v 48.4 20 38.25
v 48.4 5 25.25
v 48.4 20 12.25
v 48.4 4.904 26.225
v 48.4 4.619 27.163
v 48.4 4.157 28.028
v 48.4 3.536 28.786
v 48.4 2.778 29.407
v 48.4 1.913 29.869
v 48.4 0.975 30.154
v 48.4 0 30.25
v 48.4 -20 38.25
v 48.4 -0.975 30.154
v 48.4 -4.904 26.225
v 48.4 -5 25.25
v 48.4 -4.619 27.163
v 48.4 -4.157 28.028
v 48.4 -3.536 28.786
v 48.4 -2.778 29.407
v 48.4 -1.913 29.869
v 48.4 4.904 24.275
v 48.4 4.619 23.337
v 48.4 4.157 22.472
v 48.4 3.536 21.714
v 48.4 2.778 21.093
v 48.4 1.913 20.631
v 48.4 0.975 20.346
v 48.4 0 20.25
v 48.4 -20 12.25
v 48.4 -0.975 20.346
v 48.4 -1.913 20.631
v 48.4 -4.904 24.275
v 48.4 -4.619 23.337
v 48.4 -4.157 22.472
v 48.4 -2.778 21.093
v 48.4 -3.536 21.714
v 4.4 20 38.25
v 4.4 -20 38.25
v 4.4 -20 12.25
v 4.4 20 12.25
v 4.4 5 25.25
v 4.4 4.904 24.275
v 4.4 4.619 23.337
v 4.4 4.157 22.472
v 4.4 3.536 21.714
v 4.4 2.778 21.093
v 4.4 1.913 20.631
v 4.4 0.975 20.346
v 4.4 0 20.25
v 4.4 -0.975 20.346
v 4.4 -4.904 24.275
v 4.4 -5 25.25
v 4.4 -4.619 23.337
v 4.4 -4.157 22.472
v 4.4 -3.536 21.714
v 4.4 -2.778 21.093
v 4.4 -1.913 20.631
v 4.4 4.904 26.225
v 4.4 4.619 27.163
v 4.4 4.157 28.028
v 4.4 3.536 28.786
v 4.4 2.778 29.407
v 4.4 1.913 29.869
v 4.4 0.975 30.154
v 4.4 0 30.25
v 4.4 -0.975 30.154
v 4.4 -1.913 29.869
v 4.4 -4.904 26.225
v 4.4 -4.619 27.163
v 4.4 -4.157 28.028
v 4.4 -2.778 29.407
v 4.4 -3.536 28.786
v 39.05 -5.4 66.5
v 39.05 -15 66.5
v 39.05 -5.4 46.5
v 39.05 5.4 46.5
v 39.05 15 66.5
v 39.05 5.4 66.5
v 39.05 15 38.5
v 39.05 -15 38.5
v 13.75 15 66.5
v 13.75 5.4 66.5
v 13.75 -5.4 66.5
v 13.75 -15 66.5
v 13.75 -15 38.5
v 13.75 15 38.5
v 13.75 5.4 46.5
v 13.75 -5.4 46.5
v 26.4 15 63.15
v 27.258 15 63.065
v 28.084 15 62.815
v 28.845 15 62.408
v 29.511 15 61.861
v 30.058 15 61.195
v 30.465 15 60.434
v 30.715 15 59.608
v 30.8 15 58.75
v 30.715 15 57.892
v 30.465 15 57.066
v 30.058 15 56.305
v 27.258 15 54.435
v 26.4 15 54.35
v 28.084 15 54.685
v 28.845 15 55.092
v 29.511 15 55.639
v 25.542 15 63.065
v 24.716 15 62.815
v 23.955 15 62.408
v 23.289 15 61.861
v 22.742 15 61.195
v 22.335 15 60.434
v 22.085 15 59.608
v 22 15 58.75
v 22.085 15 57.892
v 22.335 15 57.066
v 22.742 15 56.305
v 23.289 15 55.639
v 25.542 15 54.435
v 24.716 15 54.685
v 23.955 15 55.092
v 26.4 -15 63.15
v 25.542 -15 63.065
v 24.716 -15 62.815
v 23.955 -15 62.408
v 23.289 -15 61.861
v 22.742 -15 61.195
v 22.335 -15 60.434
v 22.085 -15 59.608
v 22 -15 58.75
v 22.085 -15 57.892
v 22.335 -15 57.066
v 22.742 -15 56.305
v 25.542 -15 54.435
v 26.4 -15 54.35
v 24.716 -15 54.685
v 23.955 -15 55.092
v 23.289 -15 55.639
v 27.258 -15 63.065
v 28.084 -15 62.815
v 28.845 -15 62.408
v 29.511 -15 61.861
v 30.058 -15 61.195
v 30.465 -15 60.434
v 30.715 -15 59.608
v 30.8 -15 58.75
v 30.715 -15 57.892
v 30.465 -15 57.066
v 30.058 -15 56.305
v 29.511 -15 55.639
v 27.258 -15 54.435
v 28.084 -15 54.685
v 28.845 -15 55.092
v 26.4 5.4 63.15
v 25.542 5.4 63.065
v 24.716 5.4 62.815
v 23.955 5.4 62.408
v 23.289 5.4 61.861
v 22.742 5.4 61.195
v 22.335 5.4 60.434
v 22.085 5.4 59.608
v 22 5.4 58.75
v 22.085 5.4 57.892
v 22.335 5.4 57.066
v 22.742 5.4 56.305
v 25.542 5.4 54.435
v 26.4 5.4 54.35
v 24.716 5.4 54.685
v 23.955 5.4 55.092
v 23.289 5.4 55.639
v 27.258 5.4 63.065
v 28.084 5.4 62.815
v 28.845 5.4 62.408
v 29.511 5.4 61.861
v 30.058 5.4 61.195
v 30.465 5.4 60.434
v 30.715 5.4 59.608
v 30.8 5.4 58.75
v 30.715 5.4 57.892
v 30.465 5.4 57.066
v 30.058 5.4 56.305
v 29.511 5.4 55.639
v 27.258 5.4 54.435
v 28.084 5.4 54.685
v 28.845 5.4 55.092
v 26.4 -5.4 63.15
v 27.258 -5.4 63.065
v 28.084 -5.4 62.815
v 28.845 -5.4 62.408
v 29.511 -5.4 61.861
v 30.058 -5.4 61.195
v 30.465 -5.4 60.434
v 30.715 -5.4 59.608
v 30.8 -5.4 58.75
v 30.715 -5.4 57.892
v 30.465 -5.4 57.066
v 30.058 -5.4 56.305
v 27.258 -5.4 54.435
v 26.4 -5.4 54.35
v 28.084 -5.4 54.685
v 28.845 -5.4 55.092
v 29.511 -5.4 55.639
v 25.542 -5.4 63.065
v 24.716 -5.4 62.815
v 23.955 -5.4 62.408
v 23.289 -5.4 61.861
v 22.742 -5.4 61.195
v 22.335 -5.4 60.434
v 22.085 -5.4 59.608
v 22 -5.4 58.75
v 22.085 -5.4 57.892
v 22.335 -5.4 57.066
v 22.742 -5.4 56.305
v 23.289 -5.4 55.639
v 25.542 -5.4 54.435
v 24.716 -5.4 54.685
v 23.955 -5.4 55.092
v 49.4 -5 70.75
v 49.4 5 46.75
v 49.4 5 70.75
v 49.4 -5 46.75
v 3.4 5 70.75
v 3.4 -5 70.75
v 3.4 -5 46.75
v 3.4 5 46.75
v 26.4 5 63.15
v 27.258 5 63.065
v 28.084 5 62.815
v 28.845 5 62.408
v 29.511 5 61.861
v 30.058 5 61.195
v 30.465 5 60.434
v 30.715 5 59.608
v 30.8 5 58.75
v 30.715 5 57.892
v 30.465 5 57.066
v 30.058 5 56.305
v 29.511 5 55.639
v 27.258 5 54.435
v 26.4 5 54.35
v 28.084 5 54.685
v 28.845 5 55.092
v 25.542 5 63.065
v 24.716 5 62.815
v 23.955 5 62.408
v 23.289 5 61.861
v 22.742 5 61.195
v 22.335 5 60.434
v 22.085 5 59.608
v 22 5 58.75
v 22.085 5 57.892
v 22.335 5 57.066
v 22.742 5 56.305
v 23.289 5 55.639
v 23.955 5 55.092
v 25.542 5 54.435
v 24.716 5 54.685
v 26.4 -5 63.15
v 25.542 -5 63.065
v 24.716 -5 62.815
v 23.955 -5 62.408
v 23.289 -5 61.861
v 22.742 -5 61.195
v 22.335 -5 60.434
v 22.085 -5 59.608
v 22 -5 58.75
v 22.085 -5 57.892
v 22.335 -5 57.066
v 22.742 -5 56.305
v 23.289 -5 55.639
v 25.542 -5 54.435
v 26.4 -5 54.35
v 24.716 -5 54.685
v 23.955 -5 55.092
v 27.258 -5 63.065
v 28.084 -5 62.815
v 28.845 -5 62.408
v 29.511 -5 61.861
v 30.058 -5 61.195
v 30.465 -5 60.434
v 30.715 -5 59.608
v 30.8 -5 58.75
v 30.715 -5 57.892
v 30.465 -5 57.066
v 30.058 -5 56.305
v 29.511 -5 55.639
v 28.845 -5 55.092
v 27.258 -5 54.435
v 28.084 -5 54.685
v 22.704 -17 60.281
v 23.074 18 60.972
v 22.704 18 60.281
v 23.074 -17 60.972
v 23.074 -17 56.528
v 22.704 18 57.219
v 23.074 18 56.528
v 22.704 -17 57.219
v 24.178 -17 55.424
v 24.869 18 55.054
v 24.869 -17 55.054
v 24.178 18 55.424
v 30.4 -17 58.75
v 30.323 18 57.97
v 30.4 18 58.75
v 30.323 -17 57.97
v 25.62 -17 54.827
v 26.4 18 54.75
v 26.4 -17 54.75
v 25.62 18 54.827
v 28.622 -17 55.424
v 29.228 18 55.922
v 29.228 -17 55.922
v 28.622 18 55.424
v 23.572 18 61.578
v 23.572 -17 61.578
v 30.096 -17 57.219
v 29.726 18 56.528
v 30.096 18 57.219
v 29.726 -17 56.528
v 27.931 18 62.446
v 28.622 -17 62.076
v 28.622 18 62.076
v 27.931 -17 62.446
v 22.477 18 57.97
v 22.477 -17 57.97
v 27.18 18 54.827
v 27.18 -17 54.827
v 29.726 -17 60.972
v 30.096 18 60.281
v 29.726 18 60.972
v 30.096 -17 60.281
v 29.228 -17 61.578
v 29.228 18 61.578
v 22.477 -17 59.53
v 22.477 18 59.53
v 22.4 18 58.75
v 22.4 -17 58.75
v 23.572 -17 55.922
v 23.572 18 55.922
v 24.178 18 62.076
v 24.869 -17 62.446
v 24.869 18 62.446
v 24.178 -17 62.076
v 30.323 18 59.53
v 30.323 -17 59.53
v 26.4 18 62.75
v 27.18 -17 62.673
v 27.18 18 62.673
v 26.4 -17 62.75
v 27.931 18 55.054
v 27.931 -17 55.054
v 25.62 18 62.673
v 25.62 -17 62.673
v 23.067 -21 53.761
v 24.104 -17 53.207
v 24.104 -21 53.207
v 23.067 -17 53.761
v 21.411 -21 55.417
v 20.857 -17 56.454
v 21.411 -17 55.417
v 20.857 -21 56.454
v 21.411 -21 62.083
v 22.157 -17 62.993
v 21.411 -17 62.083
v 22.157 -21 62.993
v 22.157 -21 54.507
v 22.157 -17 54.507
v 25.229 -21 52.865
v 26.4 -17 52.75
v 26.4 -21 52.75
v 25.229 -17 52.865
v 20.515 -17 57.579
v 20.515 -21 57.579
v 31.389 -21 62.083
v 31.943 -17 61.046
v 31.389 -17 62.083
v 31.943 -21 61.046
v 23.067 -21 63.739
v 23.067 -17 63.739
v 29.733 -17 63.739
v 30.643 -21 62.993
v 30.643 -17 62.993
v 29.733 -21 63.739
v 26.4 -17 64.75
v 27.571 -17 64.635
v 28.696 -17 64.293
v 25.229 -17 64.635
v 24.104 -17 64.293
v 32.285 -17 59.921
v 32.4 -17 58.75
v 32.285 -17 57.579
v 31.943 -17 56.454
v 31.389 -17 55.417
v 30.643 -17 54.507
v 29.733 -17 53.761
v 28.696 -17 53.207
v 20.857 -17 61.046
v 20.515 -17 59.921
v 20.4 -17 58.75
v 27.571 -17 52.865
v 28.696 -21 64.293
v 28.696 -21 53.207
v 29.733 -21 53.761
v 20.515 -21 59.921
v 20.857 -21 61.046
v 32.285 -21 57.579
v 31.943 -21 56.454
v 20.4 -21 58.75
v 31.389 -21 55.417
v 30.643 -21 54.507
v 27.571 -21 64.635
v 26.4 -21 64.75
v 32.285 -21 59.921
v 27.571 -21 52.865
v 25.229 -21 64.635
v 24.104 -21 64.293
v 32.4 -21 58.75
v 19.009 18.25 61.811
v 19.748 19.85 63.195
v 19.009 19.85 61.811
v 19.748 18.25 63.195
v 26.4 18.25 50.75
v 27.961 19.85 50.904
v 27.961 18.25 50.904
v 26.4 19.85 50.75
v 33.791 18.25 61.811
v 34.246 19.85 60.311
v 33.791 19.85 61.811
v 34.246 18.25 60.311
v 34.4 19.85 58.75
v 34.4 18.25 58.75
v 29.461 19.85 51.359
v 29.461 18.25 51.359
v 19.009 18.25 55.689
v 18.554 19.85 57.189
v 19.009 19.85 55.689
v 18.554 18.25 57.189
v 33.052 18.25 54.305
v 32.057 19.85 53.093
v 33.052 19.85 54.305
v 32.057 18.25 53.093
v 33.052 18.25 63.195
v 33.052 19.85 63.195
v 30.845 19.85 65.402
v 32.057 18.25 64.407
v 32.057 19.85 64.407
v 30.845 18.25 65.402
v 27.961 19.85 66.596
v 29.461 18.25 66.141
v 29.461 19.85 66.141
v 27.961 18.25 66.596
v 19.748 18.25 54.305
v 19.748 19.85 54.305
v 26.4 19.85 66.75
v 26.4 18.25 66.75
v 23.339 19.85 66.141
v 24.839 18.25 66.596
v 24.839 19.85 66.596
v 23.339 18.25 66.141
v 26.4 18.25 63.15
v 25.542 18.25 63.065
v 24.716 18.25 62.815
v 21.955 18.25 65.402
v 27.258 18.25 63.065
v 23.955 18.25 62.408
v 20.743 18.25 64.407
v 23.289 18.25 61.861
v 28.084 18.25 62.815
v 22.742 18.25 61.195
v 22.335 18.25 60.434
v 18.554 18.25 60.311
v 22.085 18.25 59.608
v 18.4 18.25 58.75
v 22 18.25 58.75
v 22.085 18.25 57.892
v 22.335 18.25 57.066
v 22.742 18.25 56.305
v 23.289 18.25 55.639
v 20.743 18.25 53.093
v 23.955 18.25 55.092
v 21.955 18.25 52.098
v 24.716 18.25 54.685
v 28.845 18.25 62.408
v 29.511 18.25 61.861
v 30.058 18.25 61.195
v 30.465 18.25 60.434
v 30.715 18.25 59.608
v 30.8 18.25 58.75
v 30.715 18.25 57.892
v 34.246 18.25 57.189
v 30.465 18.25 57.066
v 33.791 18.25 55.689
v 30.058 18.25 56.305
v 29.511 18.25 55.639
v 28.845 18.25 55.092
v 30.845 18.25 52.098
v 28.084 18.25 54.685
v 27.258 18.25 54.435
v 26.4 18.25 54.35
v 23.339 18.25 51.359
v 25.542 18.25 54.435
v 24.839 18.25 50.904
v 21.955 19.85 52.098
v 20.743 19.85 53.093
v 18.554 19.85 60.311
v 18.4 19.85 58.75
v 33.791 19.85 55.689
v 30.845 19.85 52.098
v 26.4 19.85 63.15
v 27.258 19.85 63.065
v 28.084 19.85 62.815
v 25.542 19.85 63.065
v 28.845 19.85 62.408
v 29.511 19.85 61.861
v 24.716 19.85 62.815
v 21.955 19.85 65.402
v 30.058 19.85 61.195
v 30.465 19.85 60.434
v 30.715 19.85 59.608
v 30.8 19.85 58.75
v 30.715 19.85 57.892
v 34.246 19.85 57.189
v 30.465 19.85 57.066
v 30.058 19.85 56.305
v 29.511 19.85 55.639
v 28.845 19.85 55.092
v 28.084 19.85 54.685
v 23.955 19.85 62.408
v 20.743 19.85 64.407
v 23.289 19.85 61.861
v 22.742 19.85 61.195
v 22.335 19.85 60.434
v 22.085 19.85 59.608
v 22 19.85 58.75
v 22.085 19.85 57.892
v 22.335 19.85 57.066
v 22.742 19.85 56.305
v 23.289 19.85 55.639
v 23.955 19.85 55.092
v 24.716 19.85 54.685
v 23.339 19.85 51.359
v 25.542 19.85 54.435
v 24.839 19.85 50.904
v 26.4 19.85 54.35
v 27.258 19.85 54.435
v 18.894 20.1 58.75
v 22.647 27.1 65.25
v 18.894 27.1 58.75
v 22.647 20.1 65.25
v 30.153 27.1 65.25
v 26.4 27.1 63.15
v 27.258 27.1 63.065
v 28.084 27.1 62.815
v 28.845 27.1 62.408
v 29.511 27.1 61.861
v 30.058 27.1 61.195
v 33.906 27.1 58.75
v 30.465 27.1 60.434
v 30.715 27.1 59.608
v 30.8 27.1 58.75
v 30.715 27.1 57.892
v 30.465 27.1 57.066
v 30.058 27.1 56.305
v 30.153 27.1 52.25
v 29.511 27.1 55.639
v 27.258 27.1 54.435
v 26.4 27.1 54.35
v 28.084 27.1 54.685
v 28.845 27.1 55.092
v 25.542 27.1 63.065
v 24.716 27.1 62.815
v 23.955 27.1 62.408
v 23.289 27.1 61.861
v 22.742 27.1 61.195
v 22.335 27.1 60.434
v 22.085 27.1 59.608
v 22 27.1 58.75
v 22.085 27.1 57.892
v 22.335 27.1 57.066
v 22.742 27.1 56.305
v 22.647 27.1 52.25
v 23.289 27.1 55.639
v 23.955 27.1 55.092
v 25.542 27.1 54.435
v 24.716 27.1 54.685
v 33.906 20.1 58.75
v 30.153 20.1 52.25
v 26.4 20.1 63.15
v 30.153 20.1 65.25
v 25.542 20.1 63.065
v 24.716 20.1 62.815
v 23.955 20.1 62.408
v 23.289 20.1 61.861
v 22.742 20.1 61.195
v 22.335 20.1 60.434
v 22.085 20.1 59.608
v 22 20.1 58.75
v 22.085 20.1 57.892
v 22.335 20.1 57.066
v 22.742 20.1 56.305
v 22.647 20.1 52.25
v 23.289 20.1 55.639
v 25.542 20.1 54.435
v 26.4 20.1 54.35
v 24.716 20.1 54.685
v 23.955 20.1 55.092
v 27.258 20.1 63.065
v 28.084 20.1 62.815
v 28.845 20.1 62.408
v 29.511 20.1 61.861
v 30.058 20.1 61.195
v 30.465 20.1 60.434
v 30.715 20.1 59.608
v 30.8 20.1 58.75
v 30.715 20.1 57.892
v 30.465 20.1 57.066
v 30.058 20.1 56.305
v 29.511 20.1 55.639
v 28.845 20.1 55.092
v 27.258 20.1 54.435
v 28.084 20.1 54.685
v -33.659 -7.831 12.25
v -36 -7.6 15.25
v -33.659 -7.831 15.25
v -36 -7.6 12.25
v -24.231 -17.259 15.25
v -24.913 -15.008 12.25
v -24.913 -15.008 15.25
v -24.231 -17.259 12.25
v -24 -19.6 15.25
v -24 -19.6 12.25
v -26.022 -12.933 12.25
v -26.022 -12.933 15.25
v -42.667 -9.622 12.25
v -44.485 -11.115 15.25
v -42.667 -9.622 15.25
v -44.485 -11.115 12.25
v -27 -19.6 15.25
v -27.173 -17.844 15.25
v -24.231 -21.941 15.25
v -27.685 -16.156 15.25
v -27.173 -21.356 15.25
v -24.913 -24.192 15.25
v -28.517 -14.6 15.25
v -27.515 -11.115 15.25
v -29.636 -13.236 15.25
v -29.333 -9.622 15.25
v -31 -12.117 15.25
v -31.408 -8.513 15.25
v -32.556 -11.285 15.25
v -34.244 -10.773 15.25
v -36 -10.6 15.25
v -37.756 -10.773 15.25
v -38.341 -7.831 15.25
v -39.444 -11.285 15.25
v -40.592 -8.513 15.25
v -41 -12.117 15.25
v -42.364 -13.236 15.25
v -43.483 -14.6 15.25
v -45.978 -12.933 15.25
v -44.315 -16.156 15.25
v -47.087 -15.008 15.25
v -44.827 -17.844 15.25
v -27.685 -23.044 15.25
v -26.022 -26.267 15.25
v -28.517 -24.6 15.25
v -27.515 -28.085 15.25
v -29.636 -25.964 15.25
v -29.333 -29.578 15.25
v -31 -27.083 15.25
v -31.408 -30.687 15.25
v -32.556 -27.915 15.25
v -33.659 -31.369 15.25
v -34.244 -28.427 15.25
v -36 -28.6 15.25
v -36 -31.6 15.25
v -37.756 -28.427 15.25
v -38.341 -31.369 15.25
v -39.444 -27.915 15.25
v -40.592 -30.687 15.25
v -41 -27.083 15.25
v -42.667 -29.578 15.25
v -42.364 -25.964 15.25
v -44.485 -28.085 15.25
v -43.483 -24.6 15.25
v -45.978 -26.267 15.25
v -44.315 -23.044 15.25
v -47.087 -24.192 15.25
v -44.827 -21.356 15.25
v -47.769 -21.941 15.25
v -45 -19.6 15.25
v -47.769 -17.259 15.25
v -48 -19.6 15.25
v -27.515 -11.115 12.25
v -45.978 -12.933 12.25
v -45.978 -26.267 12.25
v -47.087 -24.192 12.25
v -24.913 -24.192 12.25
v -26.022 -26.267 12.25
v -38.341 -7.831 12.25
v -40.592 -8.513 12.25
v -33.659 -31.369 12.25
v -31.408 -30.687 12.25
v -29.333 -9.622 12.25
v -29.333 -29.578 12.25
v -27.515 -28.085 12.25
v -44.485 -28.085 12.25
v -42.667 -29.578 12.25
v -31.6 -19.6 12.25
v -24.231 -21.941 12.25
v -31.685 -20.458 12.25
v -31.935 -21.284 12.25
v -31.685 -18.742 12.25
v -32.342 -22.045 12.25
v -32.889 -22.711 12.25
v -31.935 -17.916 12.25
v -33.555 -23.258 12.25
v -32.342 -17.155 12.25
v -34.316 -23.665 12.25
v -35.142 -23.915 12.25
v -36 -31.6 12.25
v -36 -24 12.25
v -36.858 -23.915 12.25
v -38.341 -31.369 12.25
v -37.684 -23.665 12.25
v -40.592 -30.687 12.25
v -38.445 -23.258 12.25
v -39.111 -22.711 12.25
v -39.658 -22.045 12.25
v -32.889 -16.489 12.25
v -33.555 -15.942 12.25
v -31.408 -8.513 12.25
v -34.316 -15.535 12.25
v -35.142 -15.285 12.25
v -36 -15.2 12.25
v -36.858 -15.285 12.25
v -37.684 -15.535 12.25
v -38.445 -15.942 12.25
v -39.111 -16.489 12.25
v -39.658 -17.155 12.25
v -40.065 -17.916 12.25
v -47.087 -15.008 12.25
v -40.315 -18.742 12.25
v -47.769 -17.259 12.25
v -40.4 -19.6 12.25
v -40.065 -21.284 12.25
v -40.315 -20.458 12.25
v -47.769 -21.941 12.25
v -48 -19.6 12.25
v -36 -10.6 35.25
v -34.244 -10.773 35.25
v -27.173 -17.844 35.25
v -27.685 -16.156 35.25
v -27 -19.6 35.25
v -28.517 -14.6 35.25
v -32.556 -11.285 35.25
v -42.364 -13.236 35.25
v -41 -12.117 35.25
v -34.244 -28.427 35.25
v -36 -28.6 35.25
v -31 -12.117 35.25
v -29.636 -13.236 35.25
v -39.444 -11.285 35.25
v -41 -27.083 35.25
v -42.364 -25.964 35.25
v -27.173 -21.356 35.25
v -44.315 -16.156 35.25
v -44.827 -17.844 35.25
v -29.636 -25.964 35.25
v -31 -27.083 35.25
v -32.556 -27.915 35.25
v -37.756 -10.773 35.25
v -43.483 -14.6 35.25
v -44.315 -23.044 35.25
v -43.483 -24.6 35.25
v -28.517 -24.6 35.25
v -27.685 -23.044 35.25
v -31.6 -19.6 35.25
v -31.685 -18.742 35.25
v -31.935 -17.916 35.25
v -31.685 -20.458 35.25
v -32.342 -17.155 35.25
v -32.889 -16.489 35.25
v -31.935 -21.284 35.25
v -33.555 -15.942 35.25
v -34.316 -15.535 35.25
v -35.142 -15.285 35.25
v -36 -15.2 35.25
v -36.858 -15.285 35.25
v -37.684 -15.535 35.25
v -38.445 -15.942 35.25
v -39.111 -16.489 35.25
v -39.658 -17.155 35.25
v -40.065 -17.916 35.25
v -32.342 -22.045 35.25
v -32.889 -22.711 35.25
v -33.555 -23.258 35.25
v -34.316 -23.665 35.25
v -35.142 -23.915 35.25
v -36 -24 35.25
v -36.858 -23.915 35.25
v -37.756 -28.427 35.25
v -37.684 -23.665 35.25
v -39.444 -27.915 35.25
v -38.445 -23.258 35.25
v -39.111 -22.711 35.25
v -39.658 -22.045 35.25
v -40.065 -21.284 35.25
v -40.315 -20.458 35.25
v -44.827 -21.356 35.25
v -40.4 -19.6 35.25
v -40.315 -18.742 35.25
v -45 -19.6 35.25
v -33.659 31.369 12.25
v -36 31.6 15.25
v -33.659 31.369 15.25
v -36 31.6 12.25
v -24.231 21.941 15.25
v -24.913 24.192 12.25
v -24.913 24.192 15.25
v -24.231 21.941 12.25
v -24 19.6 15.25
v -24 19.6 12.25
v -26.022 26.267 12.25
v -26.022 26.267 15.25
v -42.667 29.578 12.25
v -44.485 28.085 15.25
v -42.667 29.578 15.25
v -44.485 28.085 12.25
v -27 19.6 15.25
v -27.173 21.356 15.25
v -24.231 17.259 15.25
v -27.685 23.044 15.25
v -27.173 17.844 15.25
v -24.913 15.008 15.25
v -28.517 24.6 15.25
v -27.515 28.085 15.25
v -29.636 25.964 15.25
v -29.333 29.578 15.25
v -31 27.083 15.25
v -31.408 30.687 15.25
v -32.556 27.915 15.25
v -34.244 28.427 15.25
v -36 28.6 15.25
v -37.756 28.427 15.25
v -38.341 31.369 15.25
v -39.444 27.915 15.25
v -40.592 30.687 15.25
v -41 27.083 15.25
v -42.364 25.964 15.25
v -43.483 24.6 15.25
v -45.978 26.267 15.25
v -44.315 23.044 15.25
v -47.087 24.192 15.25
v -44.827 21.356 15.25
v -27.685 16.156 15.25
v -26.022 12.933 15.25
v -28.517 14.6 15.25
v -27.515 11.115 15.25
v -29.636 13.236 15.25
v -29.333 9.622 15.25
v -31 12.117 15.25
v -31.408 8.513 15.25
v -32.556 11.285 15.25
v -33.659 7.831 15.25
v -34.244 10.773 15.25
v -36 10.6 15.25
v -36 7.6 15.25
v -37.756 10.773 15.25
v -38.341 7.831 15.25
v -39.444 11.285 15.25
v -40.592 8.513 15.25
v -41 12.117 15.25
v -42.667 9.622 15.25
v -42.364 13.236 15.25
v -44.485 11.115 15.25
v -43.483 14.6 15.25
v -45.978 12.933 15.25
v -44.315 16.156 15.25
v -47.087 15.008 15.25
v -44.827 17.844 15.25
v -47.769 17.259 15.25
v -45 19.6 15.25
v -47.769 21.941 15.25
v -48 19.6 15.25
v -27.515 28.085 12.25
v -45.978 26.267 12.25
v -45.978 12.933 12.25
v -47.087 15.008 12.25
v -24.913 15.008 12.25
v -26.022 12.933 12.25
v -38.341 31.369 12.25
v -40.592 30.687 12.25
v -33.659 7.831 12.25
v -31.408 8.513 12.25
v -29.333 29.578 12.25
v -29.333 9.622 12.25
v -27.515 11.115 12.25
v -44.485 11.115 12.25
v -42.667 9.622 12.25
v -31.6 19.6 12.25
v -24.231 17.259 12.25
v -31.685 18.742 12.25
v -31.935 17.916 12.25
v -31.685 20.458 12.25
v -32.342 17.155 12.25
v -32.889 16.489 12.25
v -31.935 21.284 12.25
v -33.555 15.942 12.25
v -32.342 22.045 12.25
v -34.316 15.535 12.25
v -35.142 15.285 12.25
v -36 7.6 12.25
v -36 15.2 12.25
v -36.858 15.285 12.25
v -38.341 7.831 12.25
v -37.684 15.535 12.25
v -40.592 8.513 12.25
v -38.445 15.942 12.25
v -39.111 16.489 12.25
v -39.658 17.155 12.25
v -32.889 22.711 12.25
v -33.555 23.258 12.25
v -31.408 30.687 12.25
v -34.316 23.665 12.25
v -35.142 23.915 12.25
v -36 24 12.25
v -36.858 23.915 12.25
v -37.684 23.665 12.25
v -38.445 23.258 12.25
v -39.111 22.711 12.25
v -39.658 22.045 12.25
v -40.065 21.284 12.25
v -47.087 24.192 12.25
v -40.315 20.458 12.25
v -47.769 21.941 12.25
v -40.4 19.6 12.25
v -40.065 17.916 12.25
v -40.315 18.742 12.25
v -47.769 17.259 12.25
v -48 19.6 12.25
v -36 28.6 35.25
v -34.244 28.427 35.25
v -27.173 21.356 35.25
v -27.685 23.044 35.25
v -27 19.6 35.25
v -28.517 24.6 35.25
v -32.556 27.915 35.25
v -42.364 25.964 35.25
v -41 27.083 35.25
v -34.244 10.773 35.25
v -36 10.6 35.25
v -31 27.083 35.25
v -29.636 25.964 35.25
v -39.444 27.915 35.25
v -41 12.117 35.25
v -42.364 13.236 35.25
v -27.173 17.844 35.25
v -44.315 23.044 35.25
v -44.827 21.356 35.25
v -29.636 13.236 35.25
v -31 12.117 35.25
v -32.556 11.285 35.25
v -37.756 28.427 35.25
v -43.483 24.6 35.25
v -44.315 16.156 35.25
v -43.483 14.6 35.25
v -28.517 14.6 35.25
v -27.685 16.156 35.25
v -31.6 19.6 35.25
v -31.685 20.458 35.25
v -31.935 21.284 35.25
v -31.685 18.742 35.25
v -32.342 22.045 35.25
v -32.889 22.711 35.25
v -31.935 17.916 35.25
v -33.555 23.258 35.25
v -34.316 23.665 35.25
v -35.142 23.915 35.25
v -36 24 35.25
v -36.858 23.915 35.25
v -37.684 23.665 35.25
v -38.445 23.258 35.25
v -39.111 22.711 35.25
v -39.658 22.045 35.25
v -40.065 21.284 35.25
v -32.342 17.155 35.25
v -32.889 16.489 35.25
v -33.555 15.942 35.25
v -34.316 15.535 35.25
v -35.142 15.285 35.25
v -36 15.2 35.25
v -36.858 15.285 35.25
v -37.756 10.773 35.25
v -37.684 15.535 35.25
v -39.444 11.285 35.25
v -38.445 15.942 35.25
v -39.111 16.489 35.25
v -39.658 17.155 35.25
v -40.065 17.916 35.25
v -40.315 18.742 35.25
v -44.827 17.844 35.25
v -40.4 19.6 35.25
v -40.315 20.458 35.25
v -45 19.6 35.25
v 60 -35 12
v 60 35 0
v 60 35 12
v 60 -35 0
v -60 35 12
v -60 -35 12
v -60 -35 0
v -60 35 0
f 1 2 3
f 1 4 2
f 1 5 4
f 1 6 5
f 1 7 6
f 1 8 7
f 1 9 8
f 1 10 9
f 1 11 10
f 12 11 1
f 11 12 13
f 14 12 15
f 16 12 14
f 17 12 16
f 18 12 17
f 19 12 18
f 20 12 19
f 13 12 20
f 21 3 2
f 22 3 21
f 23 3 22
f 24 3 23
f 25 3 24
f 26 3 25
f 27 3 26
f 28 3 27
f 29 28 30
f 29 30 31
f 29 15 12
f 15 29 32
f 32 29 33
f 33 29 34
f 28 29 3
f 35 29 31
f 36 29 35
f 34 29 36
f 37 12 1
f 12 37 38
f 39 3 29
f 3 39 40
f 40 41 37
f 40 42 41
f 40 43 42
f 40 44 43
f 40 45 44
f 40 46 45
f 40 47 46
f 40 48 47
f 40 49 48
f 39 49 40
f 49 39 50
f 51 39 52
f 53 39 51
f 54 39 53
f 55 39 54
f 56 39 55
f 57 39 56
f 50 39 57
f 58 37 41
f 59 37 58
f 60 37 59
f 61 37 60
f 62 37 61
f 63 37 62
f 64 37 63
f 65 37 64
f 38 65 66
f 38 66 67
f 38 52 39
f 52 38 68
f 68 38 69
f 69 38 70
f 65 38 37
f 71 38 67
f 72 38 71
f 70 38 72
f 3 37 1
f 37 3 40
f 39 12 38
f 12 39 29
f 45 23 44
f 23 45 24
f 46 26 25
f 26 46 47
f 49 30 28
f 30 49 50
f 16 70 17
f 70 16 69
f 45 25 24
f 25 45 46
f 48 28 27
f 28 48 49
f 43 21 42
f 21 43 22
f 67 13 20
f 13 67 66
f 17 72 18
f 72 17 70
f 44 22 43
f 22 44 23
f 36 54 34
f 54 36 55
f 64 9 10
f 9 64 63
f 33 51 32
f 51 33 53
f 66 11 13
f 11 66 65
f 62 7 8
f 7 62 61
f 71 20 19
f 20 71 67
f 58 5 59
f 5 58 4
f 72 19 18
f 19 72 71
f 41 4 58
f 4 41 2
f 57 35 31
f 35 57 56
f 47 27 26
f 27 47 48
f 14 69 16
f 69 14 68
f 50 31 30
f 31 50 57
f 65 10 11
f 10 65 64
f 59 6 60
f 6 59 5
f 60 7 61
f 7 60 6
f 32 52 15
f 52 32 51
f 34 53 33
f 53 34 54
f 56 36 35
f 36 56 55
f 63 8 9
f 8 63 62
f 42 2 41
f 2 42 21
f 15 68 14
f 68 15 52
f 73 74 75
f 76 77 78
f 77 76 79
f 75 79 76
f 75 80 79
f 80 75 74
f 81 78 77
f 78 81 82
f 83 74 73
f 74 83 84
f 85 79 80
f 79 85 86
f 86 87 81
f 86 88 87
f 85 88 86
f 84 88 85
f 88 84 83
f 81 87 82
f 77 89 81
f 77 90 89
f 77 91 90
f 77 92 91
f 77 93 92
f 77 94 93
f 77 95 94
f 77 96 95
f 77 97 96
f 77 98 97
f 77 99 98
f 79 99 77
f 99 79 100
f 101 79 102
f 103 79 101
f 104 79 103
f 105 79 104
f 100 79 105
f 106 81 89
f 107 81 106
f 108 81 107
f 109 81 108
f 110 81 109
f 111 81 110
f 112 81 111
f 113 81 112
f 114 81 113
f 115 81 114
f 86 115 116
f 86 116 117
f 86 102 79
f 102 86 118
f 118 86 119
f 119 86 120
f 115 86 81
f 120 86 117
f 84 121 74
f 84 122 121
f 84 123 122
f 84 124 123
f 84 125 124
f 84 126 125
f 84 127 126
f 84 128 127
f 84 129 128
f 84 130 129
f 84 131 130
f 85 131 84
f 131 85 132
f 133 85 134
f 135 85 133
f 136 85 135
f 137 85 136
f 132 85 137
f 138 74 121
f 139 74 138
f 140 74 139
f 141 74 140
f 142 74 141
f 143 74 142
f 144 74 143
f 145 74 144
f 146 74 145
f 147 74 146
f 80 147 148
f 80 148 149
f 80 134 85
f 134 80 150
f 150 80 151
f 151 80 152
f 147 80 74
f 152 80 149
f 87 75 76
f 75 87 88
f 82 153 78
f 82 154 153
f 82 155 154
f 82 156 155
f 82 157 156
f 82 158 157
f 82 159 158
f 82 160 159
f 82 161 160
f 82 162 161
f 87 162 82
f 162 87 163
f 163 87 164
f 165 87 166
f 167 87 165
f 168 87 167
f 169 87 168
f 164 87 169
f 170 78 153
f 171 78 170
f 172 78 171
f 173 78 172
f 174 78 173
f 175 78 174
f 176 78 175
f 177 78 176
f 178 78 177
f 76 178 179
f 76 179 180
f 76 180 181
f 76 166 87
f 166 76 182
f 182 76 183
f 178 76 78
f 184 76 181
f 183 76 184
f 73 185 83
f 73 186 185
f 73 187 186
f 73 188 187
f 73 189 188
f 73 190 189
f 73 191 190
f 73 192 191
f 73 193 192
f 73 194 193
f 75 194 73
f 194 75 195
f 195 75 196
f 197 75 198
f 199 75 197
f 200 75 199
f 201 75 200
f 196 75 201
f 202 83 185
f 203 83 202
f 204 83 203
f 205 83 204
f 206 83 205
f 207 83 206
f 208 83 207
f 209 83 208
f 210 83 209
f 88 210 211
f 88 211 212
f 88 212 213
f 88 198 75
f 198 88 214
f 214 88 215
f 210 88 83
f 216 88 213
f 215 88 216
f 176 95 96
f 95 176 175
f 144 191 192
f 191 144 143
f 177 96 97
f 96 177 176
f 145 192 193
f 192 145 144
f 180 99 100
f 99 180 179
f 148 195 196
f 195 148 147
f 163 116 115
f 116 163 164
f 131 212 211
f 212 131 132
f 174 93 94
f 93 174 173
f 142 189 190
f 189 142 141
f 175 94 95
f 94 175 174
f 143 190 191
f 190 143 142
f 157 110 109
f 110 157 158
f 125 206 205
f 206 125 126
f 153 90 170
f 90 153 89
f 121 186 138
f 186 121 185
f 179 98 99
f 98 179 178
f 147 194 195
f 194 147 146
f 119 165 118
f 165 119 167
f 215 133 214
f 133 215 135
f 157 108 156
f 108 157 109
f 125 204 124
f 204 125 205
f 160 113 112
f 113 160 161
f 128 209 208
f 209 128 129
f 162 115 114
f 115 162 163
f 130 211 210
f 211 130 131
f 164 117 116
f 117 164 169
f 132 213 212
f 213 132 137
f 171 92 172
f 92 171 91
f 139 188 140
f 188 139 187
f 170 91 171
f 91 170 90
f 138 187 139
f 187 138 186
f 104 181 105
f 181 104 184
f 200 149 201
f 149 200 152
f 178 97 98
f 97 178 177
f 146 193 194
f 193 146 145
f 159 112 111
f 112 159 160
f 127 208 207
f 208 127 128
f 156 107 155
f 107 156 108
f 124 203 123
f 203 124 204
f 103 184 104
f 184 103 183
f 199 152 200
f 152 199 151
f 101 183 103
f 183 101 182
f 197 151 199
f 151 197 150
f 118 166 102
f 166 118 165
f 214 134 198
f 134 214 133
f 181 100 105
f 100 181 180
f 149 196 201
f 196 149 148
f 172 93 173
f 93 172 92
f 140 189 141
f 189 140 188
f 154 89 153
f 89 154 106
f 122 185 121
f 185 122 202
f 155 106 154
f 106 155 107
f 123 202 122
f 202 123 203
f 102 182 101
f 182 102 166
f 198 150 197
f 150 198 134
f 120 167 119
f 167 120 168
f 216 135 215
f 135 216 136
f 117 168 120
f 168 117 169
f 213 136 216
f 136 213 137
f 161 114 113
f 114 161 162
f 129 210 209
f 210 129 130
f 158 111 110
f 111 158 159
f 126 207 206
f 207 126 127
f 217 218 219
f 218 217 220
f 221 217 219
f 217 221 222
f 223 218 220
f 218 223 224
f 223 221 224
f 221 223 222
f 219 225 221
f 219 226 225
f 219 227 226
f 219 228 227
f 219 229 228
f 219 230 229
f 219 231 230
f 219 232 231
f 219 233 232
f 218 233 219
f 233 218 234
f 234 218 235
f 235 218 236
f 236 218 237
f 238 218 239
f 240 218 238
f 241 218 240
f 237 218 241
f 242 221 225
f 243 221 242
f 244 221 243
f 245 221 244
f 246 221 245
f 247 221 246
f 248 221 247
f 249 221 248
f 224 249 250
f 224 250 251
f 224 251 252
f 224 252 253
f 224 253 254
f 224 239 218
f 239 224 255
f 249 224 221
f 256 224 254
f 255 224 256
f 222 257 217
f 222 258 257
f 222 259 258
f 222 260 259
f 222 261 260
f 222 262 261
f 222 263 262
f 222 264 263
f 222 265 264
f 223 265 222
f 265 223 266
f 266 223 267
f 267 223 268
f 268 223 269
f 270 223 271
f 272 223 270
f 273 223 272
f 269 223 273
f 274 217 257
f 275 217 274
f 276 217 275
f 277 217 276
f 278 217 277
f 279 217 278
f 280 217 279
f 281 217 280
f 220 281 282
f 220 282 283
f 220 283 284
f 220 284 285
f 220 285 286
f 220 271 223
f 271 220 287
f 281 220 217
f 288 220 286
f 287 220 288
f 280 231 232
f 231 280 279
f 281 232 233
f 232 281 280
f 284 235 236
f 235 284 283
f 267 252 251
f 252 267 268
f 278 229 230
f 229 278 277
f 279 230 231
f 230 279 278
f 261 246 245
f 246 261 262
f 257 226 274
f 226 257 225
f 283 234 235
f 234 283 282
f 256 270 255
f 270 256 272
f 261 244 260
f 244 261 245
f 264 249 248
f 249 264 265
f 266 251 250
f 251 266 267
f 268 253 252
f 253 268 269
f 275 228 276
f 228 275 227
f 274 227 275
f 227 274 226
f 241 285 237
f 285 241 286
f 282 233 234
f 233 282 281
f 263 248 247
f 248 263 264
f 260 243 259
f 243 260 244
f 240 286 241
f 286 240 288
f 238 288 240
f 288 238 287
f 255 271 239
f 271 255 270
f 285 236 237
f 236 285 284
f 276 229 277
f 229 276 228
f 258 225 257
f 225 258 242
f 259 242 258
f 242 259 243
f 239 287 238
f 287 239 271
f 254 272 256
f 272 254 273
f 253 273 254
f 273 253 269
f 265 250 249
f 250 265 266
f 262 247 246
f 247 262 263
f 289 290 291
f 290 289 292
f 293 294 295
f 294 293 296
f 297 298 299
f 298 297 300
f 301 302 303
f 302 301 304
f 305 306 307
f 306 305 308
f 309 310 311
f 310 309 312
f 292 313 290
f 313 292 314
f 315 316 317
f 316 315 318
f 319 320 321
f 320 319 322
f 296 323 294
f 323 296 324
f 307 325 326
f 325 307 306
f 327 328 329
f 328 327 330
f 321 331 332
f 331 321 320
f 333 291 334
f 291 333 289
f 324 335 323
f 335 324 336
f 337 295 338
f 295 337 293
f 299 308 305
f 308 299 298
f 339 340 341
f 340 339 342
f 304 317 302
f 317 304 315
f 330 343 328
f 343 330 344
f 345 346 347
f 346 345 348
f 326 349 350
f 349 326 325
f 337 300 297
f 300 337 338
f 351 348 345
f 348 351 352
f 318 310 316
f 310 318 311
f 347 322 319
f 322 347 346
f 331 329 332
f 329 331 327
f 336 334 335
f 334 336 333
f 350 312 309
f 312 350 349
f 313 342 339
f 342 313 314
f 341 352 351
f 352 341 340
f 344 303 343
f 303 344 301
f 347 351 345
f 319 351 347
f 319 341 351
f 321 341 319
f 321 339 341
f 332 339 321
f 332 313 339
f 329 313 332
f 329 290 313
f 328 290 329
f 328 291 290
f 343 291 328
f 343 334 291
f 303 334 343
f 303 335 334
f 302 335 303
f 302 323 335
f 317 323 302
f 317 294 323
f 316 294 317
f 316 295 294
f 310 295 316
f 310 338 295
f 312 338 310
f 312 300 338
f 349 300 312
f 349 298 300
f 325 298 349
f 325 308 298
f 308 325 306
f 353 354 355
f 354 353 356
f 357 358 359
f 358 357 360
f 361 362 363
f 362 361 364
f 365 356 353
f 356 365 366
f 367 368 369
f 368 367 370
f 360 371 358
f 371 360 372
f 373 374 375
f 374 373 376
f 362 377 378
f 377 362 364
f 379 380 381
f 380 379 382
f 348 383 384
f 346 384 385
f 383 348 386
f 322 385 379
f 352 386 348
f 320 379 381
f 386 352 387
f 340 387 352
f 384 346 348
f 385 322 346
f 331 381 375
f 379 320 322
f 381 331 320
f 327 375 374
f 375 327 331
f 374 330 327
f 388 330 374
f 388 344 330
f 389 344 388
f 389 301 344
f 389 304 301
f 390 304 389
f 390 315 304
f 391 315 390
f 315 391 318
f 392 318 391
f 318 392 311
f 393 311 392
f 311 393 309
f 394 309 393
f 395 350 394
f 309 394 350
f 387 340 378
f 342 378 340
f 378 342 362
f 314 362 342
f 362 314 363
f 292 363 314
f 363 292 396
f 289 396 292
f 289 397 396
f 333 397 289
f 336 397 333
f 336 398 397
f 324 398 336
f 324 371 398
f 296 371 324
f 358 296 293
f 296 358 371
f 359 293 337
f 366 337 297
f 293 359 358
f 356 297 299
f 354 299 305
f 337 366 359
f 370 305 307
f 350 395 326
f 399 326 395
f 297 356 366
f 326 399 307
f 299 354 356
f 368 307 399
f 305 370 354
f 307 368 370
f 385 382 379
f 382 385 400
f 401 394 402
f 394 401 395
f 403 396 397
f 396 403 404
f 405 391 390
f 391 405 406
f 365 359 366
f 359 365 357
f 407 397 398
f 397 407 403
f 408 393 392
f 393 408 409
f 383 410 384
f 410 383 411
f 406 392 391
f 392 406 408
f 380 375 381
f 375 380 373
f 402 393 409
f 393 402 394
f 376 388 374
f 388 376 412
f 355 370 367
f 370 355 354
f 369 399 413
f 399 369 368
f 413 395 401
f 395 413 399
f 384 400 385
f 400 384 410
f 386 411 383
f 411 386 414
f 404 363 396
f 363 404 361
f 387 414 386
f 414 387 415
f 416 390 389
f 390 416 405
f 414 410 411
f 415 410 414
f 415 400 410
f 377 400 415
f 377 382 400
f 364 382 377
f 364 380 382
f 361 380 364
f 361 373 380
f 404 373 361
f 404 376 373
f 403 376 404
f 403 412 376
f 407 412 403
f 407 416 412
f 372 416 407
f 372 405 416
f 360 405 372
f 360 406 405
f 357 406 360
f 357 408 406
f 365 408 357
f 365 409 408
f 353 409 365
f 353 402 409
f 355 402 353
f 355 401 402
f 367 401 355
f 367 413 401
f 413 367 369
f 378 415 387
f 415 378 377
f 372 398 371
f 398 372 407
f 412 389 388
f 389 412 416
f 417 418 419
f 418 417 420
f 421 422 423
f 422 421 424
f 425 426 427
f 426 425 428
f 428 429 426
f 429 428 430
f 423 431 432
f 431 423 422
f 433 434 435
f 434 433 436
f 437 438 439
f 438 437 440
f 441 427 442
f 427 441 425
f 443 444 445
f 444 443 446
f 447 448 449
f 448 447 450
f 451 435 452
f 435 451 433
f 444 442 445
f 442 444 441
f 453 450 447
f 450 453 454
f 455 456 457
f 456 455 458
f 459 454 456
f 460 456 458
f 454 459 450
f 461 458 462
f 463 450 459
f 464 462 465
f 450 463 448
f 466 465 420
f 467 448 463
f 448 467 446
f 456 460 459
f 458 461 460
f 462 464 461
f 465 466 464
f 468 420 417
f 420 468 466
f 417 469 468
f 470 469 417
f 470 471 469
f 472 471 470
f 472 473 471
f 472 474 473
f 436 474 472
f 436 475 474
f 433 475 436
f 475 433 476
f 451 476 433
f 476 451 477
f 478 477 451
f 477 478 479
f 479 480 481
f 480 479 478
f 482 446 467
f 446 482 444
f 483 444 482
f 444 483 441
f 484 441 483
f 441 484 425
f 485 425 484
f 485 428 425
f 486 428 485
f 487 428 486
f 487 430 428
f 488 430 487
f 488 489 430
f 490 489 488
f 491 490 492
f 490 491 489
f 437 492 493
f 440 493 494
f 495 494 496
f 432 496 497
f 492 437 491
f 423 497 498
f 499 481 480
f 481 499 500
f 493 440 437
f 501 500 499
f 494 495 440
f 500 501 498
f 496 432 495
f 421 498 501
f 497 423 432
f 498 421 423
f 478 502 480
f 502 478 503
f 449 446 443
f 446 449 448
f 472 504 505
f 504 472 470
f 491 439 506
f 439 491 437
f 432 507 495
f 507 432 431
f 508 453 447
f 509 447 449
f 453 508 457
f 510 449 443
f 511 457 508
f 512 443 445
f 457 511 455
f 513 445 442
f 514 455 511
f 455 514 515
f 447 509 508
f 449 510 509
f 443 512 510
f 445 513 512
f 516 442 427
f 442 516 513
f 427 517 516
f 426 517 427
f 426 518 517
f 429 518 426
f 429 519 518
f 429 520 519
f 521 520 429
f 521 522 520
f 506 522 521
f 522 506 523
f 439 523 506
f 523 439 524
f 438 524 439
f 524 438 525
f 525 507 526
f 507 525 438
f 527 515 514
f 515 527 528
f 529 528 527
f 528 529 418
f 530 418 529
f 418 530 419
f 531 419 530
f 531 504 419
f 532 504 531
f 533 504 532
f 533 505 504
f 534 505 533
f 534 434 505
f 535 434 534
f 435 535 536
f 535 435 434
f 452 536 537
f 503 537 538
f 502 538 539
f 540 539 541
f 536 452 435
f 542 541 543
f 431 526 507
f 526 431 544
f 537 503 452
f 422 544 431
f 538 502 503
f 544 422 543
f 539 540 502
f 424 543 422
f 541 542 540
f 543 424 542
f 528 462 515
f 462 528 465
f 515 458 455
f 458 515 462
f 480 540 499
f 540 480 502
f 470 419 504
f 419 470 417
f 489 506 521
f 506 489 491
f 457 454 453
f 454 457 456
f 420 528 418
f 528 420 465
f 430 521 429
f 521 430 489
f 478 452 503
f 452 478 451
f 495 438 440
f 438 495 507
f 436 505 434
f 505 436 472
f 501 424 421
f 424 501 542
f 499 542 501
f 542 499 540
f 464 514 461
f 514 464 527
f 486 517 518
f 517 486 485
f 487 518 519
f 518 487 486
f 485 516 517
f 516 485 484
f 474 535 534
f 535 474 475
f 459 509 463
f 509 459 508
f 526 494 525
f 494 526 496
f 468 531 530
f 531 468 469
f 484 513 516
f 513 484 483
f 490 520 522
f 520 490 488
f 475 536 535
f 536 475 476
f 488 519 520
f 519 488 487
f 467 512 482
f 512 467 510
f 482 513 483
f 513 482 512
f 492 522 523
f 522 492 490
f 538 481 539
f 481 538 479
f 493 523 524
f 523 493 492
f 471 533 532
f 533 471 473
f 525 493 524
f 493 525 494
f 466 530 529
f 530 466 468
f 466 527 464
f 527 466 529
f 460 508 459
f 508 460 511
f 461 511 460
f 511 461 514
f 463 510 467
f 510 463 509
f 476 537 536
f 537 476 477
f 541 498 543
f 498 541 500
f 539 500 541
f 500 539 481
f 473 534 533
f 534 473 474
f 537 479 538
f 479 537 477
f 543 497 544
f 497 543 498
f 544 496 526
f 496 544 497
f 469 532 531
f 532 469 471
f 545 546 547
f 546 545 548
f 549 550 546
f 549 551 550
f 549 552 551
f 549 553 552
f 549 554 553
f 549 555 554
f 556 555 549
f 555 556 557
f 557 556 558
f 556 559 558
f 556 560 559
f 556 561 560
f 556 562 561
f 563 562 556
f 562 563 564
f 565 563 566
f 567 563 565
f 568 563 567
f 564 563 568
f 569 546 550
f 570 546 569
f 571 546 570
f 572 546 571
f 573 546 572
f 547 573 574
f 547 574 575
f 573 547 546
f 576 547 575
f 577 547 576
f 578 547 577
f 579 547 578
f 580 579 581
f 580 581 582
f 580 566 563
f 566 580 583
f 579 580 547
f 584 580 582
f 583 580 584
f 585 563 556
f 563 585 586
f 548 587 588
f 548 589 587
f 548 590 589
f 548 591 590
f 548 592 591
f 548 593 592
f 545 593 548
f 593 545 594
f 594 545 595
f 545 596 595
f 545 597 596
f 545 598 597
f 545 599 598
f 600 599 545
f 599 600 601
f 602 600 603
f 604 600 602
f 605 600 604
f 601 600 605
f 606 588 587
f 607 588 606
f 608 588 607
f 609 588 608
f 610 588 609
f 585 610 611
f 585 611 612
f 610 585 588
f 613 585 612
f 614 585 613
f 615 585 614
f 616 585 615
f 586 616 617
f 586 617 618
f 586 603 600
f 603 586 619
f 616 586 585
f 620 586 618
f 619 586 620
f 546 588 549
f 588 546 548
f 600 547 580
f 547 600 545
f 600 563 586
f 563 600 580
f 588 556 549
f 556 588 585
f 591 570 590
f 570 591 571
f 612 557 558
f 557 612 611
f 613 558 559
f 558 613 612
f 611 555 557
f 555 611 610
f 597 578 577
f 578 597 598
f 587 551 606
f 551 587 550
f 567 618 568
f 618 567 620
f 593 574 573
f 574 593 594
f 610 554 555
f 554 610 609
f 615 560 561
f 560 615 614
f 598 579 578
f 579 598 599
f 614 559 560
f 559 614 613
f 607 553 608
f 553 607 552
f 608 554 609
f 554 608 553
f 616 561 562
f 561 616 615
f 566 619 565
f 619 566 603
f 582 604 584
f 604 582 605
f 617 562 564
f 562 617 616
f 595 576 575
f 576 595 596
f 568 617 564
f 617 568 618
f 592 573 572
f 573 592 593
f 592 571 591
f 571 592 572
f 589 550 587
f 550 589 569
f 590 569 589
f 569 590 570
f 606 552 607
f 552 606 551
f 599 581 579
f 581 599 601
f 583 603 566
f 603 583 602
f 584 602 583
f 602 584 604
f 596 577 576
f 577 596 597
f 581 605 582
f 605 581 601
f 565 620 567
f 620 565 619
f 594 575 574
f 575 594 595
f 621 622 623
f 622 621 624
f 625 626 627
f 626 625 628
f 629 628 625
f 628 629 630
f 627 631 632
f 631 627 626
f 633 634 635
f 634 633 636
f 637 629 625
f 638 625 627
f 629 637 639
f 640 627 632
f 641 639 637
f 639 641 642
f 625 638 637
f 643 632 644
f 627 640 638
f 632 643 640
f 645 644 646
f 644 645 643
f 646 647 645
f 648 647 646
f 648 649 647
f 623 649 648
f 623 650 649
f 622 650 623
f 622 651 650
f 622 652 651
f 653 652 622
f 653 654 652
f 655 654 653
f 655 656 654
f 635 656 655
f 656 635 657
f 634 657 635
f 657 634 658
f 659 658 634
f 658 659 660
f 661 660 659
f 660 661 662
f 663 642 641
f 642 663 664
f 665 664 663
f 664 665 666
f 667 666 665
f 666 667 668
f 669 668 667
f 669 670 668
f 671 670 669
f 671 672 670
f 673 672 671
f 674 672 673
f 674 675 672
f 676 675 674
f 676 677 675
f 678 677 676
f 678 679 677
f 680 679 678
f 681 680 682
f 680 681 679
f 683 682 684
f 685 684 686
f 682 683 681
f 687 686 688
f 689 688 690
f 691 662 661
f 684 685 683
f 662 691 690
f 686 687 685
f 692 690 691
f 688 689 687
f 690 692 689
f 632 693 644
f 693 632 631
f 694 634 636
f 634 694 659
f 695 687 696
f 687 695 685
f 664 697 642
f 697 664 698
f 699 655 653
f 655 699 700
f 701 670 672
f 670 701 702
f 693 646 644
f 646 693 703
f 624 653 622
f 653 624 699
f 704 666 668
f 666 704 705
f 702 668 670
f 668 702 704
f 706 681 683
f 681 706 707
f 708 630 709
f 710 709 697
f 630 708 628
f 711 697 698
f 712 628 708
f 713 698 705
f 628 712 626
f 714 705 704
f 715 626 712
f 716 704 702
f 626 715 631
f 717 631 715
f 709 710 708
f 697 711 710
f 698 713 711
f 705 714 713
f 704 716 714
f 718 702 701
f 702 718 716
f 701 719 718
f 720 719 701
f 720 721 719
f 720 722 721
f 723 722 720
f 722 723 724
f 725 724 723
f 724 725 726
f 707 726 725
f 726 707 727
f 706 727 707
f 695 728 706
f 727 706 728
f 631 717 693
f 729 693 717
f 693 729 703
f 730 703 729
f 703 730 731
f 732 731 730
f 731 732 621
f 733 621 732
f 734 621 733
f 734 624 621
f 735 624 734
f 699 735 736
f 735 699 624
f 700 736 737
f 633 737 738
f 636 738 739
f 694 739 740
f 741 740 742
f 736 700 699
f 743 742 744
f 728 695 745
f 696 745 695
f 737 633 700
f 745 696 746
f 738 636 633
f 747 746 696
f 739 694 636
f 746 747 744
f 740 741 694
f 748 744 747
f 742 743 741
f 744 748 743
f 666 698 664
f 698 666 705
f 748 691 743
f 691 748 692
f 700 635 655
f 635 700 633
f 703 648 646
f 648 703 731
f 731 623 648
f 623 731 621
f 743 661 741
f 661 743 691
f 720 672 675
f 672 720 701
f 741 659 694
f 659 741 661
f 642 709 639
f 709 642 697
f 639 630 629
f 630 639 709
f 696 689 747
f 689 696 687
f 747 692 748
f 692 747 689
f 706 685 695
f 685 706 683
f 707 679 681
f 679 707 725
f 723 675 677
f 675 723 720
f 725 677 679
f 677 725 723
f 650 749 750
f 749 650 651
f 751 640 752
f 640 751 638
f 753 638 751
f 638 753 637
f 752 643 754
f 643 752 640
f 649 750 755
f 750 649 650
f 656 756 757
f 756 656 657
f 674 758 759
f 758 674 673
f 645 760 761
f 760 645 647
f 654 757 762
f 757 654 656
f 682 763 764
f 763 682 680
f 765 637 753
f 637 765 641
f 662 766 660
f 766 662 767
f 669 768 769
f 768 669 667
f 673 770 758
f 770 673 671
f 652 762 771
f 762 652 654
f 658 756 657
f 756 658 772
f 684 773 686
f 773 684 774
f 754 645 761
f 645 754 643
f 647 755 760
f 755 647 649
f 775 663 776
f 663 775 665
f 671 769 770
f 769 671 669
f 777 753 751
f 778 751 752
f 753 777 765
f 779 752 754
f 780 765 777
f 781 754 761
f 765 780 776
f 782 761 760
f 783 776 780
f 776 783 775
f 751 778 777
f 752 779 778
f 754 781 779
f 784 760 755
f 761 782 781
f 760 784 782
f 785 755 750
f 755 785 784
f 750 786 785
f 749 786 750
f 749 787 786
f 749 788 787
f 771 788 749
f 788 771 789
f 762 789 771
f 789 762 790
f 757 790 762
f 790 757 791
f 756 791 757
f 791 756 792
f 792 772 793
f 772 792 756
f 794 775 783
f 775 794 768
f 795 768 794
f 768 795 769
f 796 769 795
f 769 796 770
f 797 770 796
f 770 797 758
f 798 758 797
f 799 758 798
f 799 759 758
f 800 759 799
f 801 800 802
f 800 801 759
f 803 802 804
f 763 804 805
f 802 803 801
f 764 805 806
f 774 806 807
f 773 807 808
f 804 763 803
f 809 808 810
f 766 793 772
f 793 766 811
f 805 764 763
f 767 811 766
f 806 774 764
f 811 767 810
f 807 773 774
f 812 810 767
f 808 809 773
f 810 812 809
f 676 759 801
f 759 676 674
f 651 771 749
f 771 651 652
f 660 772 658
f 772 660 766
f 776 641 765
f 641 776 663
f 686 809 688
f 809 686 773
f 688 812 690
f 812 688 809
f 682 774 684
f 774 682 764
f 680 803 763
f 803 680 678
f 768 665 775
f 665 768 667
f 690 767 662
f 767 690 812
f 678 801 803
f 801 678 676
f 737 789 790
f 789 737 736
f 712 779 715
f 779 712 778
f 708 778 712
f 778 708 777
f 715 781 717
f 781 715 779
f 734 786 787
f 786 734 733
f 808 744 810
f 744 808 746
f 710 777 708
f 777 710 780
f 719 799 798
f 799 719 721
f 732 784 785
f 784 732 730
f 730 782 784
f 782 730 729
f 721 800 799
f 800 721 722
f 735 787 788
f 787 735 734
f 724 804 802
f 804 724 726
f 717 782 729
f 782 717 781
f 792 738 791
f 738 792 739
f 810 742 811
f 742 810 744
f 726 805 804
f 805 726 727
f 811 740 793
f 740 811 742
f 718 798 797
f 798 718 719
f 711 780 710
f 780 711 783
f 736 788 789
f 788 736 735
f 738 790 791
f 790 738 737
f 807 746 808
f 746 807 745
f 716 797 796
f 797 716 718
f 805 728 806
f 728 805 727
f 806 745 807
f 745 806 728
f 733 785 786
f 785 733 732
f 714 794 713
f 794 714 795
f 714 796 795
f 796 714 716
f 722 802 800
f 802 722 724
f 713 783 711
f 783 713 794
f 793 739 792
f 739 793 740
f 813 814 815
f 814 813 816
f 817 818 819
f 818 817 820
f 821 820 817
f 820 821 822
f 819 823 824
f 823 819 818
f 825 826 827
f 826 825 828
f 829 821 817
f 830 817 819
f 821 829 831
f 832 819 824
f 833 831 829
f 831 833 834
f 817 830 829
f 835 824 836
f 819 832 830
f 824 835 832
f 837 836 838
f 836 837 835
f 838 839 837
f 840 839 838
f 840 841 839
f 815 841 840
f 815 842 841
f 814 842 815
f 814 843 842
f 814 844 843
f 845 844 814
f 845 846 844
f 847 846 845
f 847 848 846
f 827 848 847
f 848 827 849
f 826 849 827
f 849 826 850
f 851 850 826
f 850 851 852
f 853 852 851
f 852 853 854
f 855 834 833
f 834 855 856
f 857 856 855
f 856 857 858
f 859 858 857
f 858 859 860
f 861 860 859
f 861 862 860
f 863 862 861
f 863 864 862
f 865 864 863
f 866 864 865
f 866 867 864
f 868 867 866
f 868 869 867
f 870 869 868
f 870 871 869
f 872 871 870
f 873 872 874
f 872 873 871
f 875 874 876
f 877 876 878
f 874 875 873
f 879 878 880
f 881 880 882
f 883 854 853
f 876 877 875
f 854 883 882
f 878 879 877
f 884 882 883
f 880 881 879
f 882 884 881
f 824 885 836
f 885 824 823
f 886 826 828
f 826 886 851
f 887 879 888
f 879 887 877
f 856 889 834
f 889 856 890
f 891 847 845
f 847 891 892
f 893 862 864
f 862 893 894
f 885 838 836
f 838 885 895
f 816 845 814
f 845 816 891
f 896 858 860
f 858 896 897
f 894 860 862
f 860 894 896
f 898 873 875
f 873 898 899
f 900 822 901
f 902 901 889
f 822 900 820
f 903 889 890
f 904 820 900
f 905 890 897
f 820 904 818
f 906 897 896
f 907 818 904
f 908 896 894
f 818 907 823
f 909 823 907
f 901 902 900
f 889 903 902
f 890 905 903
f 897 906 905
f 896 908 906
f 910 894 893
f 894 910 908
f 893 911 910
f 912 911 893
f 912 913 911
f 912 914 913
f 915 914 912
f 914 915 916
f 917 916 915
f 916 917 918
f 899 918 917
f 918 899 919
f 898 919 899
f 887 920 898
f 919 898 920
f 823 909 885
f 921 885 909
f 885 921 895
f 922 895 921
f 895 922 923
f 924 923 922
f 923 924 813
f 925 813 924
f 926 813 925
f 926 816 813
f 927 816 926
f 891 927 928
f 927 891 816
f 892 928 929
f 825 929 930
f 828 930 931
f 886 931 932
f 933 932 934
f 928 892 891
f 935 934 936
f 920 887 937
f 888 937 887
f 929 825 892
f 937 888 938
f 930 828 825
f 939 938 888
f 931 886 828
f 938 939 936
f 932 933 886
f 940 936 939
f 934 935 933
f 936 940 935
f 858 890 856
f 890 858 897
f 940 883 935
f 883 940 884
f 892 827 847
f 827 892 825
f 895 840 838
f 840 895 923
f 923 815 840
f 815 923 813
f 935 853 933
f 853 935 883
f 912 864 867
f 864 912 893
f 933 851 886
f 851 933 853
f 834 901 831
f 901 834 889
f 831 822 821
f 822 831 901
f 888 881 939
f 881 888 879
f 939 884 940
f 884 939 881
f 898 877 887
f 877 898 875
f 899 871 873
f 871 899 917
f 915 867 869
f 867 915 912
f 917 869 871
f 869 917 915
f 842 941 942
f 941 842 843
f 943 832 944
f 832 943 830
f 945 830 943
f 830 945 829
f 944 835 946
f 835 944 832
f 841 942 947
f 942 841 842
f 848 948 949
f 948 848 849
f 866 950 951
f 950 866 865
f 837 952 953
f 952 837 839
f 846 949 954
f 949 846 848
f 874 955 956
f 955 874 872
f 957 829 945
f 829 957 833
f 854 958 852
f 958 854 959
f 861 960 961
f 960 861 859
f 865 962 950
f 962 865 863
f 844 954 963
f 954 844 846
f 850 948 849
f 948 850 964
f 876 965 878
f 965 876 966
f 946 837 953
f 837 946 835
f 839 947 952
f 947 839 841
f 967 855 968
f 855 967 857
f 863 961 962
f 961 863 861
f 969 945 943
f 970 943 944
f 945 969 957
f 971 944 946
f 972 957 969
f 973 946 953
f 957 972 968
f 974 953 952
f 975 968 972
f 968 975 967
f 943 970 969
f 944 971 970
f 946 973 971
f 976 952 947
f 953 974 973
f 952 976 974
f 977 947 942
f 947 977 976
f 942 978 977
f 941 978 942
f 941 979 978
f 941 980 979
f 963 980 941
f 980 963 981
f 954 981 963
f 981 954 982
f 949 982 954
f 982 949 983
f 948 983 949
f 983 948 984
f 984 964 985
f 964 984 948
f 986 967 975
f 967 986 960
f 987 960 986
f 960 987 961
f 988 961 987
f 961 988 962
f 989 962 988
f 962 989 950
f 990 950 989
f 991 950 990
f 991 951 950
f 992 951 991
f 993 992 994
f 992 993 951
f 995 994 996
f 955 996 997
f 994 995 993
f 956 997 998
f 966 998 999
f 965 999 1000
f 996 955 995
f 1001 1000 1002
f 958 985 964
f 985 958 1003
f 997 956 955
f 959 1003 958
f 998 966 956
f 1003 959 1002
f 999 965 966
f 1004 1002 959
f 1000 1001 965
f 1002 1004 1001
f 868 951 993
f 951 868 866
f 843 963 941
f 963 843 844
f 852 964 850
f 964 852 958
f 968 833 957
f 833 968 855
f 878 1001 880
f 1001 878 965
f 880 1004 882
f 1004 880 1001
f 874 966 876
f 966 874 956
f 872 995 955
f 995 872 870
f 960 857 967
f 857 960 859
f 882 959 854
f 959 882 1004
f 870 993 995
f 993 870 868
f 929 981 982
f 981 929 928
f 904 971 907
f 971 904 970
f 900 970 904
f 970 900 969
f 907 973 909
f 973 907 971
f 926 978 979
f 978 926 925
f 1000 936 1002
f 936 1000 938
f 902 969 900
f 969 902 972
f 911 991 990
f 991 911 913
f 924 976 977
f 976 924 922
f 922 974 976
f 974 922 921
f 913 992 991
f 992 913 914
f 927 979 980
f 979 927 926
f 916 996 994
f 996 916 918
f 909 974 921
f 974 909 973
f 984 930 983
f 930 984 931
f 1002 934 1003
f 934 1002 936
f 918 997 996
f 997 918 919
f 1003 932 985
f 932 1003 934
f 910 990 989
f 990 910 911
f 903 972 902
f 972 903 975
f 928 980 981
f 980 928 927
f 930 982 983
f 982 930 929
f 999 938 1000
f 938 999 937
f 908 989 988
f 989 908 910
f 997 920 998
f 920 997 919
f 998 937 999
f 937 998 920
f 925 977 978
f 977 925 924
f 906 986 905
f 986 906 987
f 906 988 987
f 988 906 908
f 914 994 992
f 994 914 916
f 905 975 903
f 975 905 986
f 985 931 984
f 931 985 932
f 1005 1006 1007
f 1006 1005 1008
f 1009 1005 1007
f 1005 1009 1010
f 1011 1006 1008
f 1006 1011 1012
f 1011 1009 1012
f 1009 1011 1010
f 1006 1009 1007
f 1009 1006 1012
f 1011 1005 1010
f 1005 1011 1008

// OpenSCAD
$fn = 32;

// ------------------------------------------------------------------------
// Indexing jig: plate 120 x 70 mm, pin d8
// Every part is its own module, assembly() places every instance.
// ------------------------------------------------------------------------

// --- part 1 ---
module jig_plate() {
  difference() {
    translate([-60, -35, 0]) cube([120, 70, 12]);
  }
}

// --- part 2 ---
module locator_block() {
  difference() {
    translate([-22, -20, 0]) cube([44, 40, 26]);
    translate([0, 0, 13]) rotate([0, 90, 0]) cylinder(h = 46, d = 10, center = true);
  }
}

// --- part 3 ---
module index_fork() {
  difference() {
    translate([-12.65, -15, 0]) cube([25.3, 30, 28]);
    translate([-13.65, -5.4, 8]) cube([27.3, 10.8, 21]);
    translate([0, 0, 20.25]) rotate([90, 0, 0]) cylinder(h = 32, d = 8.8, center = true);
  }
}

// --- part 4 ---
module index_arm() {
  difference() {
    translate([-23, -5, 0]) cube([46, 10, 24]);
    translate([0, 0, 12]) rotate([90, 0, 0]) cylinder(h = 12, d = 8.8, center = true);
  }
}

// --- part 5 ---
module index_pin() {
  rotate([0, 90, 0]) cylinder(h = 36, d = 8, center = true);
  translate([-21, 0, 0]) rotate([0, 90, 0]) cylinder(h = 4, d = 12);
}

// --- part 6 ---
module pin_washer() {
  difference() {
      translate([0, 0, 0]) cylinder(h = 1.6, d = 16);
      translate([0, 0, -1]) cylinder(h = 3.6, d = 8.8);
    }
}

// --- part 7 ---
module lock_nut() {
  difference() {
    linear_extrude(height = 7) polygon(points = [[7.506, 0], [3.753, 6.5], [-3.753, 6.5], [-7.506, 0], [-3.753, -6.5], [3.753, -6.5]]);
    translate([0, 0, -1]) cylinder(h = 9, d = 8.8);
  }
}

// --- part 8 ---
module guide_bush_a() {
  difference() {
    union() {
      cylinder(h = 3, d = 24);
      translate([0, 0, 3]) cylinder(h = 20, d = 18);
    }
    translate([0, 0, -1]) cylinder(h = 25, d = 8.8);
  }
}

// --- part 9 ---
module guide_bush_b() {
  difference() {
    union() {
      cylinder(h = 3, d = 24);
      translate([0, 0, 3]) cylinder(h = 20, d = 18);
    }
    translate([0, 0, -1]) cylinder(h = 25, d = 8.8);
  }
}

// --- assembly ---
module assembly() {
  color([0.80, 0.24, 0.20]) translate([0, 0, 0]) rotate([0, 0, 0]) jig_plate();
  color([0.20, 0.45, 0.75]) translate([26.4, 0, 12.25]) rotate([0, 0, 0]) locator_block();
  color([0.25, 0.62, 0.32]) translate([26.4, 0, 38.5]) rotate([0, 0, 0]) index_fork();
  color([0.92, 0.70, 0.18]) translate([26.4, 0, 46.75]) rotate([0, 0, 0]) index_arm();
  color([0.58, 0.35, 0.70]) translate([26.4, 0, 58.75]) rotate([0, 0, 90]) index_pin();
  color([0.16, 0.66, 0.66]) translate([26.4, 19.85, 58.75]) rotate([90, 0, 0]) pin_washer();
  color([0.85, 0.48, 0.18]) translate([26.4, 27.1, 58.75]) rotate([90, 0, 0]) lock_nut();
  color([0.55, 0.60, 0.65]) translate([-36, -19.6, 12.25]) rotate([0, 0, 0]) guide_bush_a();
  color([0.75, 0.30, 0.55]) translate([-36, 19.6, 12.25]) rotate([0, 0, 0]) guide_bush_b();
}

assembly();
